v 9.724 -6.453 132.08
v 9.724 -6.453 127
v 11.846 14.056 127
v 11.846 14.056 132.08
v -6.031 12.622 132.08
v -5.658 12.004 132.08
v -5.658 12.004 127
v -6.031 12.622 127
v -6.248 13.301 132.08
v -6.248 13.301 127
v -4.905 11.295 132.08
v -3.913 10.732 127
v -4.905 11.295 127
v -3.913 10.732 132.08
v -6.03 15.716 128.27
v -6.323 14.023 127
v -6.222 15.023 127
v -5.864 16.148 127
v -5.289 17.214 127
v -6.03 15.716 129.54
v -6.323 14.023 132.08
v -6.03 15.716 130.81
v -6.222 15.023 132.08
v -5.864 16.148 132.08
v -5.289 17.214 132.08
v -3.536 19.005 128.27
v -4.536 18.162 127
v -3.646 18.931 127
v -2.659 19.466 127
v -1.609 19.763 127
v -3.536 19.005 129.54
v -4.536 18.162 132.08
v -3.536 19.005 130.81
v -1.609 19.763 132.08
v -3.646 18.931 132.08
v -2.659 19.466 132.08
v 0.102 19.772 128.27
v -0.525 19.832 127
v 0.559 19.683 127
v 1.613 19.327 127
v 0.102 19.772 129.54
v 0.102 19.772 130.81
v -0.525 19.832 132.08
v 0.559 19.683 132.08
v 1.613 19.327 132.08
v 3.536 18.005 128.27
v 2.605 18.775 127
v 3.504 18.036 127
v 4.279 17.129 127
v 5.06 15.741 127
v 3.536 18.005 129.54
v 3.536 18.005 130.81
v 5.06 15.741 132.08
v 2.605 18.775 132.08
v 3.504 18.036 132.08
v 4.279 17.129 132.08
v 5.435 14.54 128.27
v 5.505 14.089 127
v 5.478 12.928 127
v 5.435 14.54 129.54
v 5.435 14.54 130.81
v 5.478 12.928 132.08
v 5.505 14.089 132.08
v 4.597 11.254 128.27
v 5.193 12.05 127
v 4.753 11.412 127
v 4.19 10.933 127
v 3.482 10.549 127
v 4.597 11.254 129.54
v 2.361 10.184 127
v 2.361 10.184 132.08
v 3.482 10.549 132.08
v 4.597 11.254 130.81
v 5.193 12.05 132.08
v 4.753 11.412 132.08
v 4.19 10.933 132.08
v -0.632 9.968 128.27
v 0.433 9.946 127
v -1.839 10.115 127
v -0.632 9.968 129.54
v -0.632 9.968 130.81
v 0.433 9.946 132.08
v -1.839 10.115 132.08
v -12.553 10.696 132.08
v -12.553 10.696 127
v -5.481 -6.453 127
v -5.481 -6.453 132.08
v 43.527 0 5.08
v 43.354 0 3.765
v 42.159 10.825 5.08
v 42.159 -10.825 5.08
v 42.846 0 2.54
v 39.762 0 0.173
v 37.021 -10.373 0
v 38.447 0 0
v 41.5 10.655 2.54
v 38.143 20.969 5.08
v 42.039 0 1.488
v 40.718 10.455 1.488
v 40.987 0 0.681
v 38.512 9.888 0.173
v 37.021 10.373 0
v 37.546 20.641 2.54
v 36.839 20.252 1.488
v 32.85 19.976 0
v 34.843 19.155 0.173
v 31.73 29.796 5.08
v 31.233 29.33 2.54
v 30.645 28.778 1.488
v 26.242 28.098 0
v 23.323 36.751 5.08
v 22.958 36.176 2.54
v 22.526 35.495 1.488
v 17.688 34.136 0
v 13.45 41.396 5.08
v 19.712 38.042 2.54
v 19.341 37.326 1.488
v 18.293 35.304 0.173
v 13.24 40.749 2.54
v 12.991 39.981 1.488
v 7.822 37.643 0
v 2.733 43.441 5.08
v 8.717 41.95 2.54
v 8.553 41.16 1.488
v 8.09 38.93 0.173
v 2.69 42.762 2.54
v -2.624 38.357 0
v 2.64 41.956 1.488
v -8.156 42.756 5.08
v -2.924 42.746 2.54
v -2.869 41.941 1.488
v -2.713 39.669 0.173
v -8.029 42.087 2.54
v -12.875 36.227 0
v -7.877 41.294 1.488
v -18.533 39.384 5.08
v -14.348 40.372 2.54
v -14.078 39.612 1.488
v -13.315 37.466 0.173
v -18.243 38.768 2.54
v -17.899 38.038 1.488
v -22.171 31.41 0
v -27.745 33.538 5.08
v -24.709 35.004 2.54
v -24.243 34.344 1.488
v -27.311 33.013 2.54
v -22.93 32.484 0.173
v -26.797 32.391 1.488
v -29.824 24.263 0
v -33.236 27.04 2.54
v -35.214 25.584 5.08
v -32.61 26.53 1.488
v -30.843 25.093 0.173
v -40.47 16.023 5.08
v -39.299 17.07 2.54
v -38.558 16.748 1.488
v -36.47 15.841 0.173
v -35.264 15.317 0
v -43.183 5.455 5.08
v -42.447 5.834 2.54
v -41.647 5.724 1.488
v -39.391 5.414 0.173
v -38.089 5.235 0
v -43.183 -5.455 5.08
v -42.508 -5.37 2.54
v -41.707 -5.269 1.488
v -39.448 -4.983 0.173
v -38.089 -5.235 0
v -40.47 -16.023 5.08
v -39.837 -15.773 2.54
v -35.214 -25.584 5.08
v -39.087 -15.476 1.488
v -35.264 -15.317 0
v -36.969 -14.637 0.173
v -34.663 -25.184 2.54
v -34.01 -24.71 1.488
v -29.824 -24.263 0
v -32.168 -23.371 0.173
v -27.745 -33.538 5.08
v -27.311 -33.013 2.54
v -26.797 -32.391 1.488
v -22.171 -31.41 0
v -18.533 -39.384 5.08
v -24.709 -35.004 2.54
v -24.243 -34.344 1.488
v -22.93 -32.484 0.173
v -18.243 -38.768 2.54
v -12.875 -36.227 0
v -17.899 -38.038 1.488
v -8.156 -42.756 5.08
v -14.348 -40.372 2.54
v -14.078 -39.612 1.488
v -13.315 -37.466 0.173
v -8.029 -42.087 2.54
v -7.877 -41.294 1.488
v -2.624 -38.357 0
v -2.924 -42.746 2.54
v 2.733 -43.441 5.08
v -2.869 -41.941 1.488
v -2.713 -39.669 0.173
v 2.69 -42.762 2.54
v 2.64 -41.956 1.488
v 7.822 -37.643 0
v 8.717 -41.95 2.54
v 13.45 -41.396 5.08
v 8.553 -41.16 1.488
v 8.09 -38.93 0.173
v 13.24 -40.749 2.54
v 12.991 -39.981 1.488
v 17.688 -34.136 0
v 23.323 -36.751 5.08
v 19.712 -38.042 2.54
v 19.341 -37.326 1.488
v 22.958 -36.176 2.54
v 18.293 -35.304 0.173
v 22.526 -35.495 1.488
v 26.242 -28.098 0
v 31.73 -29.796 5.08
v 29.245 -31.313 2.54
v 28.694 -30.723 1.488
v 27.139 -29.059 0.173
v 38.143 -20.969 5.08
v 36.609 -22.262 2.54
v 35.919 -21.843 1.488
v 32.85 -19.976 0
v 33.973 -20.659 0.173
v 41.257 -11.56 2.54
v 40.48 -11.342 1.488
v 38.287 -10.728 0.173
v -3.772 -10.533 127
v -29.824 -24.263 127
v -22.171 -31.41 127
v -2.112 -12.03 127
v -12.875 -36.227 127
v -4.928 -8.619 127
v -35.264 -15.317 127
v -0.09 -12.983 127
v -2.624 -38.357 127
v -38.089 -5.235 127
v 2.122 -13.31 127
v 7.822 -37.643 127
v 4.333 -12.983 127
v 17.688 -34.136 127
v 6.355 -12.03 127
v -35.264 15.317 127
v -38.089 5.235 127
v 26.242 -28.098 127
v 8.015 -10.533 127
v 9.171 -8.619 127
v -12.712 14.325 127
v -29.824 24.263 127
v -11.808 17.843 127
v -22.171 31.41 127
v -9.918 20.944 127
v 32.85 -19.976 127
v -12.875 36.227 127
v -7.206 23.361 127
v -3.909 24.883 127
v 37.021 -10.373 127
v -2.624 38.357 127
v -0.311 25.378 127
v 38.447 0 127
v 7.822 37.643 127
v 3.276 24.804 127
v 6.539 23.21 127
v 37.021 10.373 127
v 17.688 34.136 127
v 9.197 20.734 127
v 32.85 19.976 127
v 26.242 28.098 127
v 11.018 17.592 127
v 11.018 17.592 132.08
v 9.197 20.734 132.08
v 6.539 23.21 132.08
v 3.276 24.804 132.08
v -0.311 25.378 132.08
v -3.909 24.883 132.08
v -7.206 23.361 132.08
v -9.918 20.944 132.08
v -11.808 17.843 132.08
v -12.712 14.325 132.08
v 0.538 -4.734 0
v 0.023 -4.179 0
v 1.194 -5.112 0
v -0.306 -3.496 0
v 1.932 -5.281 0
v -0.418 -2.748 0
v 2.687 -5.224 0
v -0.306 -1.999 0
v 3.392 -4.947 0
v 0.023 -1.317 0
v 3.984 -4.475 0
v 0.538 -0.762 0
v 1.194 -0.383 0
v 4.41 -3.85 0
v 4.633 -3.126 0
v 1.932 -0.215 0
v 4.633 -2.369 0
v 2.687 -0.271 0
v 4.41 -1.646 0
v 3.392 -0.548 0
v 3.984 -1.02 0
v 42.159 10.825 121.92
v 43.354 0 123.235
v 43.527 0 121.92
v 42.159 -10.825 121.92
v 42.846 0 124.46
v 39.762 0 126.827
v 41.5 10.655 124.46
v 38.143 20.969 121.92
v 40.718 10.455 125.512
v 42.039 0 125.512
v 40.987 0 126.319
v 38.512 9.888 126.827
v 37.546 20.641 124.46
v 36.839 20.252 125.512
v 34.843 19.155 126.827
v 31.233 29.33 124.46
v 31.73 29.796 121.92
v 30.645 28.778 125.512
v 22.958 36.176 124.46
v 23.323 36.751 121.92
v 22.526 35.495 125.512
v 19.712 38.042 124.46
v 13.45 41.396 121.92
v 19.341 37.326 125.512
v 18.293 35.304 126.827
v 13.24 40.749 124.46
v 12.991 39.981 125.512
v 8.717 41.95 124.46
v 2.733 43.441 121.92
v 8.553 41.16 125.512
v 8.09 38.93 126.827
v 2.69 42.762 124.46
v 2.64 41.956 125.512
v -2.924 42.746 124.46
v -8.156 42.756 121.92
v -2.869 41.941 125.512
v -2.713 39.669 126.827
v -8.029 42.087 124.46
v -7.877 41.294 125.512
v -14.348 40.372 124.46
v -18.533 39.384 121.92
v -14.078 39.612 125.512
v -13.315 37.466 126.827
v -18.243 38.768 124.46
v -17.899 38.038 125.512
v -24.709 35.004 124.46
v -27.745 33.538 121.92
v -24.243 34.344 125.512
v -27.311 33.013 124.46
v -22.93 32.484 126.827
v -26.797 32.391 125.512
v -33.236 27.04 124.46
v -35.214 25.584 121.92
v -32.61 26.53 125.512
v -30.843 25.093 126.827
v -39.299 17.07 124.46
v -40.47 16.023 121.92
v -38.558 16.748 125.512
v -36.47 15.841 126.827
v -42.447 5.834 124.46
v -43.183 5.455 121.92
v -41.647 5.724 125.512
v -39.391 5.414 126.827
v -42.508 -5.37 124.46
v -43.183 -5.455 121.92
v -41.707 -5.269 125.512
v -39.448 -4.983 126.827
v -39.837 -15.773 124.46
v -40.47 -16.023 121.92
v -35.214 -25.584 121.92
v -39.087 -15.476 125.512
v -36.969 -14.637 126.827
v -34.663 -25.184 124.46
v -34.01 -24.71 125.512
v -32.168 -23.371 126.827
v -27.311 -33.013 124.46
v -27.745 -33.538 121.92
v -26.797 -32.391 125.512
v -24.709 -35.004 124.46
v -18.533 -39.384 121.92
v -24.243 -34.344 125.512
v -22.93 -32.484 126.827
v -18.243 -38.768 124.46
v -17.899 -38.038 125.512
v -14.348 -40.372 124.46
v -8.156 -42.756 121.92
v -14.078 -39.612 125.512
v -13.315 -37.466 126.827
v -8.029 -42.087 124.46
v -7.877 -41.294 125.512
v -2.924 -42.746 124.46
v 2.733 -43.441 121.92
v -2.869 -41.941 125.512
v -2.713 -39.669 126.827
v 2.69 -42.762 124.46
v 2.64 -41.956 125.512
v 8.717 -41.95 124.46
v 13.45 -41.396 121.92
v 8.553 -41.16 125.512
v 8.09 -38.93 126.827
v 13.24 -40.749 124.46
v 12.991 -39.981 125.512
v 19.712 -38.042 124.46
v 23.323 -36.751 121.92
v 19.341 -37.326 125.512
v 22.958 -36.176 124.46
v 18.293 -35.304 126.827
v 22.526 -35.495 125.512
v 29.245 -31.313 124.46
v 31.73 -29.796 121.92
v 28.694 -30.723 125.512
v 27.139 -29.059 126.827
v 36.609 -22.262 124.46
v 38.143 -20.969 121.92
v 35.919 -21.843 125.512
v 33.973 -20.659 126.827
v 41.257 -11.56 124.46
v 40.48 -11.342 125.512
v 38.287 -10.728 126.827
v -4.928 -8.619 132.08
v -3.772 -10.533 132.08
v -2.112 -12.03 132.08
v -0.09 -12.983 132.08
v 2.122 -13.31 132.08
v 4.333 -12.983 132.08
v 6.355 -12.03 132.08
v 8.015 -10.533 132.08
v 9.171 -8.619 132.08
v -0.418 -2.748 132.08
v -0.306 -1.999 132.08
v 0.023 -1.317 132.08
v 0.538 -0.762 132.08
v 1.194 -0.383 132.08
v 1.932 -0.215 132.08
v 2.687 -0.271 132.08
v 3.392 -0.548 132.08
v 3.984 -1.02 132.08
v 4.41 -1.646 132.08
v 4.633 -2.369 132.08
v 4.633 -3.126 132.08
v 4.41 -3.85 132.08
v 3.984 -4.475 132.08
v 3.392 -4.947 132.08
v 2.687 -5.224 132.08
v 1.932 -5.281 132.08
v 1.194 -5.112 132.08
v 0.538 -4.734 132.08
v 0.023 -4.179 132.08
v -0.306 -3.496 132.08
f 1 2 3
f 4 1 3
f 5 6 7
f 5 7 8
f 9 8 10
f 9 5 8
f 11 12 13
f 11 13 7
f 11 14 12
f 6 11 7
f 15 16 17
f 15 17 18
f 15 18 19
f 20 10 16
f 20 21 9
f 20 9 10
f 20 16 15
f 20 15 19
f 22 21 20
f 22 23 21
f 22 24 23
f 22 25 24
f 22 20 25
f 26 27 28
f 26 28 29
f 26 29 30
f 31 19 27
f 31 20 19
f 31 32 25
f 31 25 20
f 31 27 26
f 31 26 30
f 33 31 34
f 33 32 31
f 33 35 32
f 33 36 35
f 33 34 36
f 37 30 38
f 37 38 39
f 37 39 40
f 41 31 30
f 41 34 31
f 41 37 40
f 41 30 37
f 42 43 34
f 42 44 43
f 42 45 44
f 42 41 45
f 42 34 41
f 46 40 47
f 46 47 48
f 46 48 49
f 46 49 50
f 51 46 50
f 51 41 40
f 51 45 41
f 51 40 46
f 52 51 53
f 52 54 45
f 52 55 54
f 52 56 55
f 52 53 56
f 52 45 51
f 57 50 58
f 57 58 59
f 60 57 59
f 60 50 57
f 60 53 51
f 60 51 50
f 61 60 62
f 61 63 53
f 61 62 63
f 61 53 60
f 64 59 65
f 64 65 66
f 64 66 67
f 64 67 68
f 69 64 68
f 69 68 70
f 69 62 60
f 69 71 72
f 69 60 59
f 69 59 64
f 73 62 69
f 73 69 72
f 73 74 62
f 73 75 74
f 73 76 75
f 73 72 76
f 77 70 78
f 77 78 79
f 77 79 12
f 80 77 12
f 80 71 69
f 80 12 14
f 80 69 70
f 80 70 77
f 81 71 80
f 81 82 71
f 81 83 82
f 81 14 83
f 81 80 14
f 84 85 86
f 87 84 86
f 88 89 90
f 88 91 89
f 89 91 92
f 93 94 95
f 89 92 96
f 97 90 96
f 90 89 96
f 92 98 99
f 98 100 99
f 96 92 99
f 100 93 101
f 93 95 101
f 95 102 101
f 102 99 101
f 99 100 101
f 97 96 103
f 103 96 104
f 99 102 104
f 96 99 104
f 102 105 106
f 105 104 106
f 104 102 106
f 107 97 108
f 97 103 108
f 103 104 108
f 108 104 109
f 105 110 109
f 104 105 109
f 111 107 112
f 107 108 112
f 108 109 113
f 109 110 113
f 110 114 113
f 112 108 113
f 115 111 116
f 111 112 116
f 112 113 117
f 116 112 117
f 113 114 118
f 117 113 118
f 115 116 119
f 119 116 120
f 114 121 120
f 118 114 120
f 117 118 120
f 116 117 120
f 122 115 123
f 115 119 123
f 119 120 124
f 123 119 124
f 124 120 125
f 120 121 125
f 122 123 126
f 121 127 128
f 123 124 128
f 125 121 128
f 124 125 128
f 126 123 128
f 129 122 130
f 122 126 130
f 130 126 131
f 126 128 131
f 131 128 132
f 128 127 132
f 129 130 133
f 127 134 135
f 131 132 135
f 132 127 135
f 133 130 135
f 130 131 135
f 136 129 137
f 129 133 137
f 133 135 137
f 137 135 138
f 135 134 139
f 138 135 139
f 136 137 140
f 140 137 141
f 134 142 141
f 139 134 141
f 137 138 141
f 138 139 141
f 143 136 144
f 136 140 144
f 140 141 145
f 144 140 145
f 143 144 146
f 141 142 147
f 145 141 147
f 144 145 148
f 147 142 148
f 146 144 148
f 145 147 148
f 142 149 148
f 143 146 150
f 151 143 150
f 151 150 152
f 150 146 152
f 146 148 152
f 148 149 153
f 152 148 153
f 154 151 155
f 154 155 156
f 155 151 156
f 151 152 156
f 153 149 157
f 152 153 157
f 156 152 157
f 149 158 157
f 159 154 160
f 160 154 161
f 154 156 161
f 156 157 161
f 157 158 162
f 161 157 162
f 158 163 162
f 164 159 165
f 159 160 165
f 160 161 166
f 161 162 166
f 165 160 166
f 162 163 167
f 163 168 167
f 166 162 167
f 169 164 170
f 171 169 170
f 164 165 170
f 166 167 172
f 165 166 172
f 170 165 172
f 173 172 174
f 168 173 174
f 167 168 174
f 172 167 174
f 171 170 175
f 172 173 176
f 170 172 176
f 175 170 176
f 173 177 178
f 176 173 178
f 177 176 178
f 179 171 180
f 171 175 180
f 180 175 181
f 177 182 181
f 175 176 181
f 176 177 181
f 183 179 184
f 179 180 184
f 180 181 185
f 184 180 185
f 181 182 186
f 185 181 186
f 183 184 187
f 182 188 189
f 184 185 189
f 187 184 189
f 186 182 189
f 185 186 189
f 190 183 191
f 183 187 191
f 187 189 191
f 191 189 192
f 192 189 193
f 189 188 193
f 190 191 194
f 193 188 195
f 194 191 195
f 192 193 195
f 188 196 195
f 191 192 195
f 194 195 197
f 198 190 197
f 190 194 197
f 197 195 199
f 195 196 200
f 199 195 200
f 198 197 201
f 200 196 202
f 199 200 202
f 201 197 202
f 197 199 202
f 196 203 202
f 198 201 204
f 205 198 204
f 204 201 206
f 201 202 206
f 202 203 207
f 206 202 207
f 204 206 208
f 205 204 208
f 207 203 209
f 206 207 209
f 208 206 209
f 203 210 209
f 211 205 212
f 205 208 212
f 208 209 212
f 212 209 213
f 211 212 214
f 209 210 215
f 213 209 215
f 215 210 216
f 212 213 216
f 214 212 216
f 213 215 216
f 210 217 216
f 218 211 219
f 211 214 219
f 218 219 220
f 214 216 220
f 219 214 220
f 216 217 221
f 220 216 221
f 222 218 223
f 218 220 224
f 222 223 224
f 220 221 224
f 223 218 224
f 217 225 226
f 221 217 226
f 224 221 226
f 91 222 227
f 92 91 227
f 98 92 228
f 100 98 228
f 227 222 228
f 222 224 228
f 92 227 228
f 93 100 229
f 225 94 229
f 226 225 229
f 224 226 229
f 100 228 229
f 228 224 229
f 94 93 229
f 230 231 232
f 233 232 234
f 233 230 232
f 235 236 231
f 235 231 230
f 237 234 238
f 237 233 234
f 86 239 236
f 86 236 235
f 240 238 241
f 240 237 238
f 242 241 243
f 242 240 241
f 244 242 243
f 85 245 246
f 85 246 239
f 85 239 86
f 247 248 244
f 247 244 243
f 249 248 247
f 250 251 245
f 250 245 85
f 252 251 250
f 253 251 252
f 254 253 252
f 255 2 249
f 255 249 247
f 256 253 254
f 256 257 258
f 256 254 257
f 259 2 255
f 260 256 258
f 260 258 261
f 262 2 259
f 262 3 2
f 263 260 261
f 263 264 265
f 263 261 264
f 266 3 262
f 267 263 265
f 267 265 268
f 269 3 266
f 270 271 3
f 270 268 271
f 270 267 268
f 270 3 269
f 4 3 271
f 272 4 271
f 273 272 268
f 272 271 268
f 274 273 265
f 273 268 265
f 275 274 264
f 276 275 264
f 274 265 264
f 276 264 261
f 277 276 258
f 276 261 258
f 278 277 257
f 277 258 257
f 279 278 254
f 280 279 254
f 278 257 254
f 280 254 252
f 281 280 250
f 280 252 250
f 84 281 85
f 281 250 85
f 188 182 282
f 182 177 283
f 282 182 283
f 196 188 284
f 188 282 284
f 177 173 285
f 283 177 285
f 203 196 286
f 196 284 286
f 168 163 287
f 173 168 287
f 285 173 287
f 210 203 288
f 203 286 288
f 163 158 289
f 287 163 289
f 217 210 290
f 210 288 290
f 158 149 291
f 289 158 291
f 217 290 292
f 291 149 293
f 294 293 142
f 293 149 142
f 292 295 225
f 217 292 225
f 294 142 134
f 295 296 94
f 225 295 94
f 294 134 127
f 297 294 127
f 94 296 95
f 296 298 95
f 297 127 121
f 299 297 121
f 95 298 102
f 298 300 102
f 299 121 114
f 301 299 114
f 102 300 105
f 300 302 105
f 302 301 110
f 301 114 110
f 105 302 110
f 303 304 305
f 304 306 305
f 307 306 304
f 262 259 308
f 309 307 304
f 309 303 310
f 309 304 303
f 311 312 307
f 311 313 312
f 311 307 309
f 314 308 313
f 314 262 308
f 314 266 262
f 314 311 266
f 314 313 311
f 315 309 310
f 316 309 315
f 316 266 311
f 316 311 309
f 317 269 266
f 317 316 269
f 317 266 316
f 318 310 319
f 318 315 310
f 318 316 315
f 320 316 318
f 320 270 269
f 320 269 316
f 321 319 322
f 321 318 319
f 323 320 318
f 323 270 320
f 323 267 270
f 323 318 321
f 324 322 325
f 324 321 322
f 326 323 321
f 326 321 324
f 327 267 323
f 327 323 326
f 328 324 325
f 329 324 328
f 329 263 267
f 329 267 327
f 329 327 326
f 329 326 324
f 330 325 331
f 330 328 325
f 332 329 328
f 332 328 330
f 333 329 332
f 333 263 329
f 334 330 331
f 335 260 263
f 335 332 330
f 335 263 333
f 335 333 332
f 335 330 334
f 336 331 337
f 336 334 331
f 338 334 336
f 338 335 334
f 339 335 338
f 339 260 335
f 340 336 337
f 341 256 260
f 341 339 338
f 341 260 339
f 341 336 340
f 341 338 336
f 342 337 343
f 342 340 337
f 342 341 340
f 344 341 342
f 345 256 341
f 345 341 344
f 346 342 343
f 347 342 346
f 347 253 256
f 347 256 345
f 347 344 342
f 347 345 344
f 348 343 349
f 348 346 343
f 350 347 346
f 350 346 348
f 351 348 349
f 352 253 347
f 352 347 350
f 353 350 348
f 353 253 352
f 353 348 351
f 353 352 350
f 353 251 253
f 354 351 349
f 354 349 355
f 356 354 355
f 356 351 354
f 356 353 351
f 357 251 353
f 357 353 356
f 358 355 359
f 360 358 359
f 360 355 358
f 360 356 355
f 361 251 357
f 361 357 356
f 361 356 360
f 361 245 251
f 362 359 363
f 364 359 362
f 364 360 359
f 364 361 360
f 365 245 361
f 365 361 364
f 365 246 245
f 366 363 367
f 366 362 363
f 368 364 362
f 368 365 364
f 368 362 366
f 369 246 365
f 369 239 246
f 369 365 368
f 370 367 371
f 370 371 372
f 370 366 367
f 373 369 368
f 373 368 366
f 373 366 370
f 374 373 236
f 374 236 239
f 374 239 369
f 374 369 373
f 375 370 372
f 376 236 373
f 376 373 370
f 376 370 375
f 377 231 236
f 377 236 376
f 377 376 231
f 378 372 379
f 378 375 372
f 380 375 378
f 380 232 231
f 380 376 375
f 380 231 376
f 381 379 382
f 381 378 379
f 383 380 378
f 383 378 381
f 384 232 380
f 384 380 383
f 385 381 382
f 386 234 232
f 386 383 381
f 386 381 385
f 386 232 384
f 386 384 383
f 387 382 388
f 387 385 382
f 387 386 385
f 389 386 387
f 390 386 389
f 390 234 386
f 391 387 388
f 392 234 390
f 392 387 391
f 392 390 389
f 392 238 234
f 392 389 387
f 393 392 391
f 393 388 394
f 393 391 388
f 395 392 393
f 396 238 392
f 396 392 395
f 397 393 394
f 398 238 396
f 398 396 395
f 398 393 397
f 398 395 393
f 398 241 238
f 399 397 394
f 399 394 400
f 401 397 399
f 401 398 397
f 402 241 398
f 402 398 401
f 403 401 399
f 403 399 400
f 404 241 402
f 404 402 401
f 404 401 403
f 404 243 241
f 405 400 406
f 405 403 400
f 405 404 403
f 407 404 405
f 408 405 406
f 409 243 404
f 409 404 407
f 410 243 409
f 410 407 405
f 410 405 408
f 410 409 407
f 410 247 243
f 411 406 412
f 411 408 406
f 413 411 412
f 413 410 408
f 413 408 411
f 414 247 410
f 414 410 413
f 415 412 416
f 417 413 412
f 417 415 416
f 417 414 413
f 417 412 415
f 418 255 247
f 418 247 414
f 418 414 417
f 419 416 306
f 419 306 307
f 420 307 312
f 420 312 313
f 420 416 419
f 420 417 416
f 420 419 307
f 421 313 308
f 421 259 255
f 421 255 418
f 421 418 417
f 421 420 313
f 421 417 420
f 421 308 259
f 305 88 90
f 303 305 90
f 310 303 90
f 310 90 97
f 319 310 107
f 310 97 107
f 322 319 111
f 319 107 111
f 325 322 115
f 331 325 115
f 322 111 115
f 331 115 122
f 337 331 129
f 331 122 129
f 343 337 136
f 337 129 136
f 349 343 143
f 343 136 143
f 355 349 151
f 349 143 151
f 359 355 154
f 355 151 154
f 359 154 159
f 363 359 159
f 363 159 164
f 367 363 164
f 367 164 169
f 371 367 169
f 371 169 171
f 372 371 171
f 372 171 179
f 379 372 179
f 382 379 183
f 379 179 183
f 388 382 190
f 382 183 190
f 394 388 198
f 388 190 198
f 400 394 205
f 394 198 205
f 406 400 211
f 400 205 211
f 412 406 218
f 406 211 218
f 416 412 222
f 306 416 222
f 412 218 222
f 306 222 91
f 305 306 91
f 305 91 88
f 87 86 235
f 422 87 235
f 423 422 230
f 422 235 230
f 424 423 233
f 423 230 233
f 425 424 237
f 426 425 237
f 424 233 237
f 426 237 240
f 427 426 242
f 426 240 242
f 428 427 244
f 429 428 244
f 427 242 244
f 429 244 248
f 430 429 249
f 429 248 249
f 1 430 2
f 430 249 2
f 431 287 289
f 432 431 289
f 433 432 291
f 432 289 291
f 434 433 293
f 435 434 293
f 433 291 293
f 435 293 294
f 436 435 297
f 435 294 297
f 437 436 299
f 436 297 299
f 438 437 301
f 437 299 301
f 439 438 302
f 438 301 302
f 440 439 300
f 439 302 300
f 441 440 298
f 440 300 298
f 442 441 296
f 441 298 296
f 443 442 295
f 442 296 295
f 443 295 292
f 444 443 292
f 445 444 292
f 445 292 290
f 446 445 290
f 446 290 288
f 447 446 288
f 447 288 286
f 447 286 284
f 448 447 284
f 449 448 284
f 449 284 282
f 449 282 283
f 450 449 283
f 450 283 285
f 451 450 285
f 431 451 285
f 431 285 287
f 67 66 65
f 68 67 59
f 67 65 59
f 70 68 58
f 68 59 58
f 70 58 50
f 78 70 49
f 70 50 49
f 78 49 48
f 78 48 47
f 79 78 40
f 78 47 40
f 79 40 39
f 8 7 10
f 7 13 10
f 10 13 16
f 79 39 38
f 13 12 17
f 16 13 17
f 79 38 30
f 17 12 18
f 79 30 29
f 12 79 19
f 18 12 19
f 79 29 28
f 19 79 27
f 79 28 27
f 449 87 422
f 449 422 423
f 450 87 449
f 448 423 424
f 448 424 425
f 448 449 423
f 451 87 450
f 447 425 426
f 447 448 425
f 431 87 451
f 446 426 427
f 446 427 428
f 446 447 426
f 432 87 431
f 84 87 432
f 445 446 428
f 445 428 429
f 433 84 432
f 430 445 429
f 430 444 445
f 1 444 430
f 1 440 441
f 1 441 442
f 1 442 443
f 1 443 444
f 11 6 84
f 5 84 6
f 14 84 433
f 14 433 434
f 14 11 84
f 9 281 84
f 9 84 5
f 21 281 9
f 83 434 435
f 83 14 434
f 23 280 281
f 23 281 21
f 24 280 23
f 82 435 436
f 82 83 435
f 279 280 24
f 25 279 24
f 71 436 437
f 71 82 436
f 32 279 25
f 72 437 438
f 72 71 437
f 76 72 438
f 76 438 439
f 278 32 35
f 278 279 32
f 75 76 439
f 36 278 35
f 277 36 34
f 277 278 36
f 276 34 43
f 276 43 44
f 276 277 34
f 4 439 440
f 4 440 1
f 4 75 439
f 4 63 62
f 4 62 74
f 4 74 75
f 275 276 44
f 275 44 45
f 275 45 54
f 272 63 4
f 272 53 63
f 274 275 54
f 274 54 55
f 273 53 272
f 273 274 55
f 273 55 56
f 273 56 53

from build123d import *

# Parameters (mm, degrees)
F0_R     = 43.5266995613
F1_DEPTH = 127
F2_R     = 5.08
F4_DEPTH = 5.08
F6_DEPTH = 5.08
F8_D     = 5.08


with BuildPart() as f1:
    # F0 (on Top) → F1 (new body)
    with BuildSketch(Plane.XY):
        Circle(F0_R)
    extrude(amount=F1_DEPTH)

    # F2
    f2_edges = [f1.edges().sort_by_distance(p)[0] for p in [
        (43.5267, 0, 63.5),
        (-43.5267, 0, 0),
        (-43.5267, 0, 127),
    ]]
    fillet(f2_edges, radius=F2_R)

    # F3 (on face) → F4 (join)
    with BuildSketch(Plane.XY.offset(127)):
        with BuildLine():
            Line((9.7240488976, -6.4532333054), (11.8456594646, 14.0556711704))
            ThreePointArc((11.8456594646, 14.0556711704), (-2.1279540893, 25.2634606559), (-12.5528648496, 10.696454905))
            Line((-12.5528648496, 10.696454905), (-5.4808282293, -6.4532333054))
            ThreePointArc((-5.4808282293, -6.4532333054), (2.1216103341, -13.309783456), (9.7240488976, -6.4532333054))
        make_face()
    extrude(amount=F4_DEPTH)

    # F5 (on face) → F6 (cut)
    with BuildSketch(Plane.XY.offset(132.08)):
        with BuildLine():
            add(Edge.make_bspline(
                [(-5.6576291099, 12.0042935014), (-7.2494417271, 14.0385394216), (-4.3021102383, 20.9906666124), (4.4746239471, 19.4157133137), (7.4988739115, 8.9464331045), (-3.7704655796, 9.5926059252), (-5.6576291099, 12.0042935014)],
                knots=[0, 0, 0, 0, 0.2415357815, 0.4801991319, 0.7136487592, 1, 1, 1, 1], degree=3))
        make_face()
    extrude(amount=-F6_DEPTH, mode=Mode.SUBTRACT)

    # F8 (through all)
    with Locations(Plane.XY.offset(132.08)):
        with Locations((2.1216121968, -2.747733146)):
            Hole(F8_D / 2)


solid = f1.part
